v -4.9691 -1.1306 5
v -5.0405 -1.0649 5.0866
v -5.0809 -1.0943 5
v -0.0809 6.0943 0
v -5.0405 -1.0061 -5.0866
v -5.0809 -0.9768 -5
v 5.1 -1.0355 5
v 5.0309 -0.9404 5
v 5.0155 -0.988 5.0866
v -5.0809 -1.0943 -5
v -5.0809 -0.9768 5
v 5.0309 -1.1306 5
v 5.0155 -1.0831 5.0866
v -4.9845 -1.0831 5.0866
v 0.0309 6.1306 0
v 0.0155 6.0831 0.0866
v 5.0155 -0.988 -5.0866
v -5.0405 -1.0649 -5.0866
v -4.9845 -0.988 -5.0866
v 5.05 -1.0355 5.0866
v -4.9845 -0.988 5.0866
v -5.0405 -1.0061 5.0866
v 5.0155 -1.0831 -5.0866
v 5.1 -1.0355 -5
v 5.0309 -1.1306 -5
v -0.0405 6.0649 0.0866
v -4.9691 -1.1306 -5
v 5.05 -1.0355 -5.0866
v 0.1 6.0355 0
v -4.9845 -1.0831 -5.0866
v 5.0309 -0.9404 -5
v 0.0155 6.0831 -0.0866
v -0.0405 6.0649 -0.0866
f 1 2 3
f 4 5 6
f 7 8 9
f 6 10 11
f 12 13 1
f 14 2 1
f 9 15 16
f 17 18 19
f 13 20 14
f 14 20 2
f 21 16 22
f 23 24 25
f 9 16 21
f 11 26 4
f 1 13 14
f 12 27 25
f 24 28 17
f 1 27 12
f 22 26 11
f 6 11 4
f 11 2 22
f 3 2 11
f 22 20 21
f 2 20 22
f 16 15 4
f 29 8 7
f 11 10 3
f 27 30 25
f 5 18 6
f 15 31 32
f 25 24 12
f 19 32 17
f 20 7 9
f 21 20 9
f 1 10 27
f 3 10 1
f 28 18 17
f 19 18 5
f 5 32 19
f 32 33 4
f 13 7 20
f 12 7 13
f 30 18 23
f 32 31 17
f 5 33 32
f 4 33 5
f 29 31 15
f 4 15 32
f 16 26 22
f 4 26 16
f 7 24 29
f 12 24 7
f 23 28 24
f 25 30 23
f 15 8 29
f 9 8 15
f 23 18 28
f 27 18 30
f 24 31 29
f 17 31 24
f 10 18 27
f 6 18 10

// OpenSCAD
// Auto-generated OpenSCAD file

    inner_points = 10*[[0.499999999647243, -0.10355339109877267, -0.5000000000000022], [-0.5000000003527529, -0.10355339028132902, 0.5000000000000022], [-0.5000000003527572, -0.10355339028132601, -0.49999999999999795], [0.4999999996472473, -0.10355339109877568, 0.49999999999999795], [2.2526713020467915e-10, 0.6035533904964967, 2.128597539314253e-15]];

    outer_points = 10*[[0.7071067811865476, 0.0, -2.669135025276785e-09], [-0.7071067811865476, 0.0, 2.669135025276785e-09], [-2.6278612663574398e-14, 0.7071067811522772, -6.961725442369196e-06], [2.6278612663574398e-14, -0.7071067811522772, 6.961725442369196e-06], [2.6691350251474237e-09, 6.961725442369196e-06, 0.7071067811522772]];

    // Convex hull for inner set (I)
    module inner_hull() {
        hull() {
            for (p = inner_points) {
                translate(p) sphere(r=0.1);
            }
        }
    }

    // Convex hull for outer set (O) minus inner hull (O \ I)
    module outer_minus_inner() {
        difference() {
            hull() {
                for (p = outer_points) {
                    translate(p) sphere(r=0.1);
                }
            }
            inner_hull(); // Subtract inner hull
        }
    }

    // Convex hull for outer set (O) minus all translated inner hulls
    module outer_minus_AllTranslationInner() {
        difference() {
            hull() {
                for (p = outer_points) {
                    translate(p) sphere(r=0.1);
                }
            }
            hull() {
                translate([0,0,50]) inner_hull();
                translate([0,0,-50]) inner_hull();
            }; // Subtract translated inner hulls
        }
    }

    // Difference between outer_minus_inner and outer_minus_AllTranslationInner
    module outer_minus_inner_diff() {
        difference() {
            // Outer minus inner
            difference() {
                hull() {
                    for (p = outer_points) {
                        translate(p) sphere(r=0.1);
                    }
                }
                inner_hull();
            }

            // Subtract Outer minus AllTranslationInner
            difference() {
                hull() {
                    for (p = outer_points) {
                        translate(p) sphere(r=0.1);
                    }
                }
                hull() {
                    translate([0,0,50]) inner_hull();
                    translate([0,0,-50]) inner_hull();
                };
            }
        }
    }

    // Rendering all with colors applied
    color([1, 0, 0, 0.5]) inner_hull(); // Transparent red
    
